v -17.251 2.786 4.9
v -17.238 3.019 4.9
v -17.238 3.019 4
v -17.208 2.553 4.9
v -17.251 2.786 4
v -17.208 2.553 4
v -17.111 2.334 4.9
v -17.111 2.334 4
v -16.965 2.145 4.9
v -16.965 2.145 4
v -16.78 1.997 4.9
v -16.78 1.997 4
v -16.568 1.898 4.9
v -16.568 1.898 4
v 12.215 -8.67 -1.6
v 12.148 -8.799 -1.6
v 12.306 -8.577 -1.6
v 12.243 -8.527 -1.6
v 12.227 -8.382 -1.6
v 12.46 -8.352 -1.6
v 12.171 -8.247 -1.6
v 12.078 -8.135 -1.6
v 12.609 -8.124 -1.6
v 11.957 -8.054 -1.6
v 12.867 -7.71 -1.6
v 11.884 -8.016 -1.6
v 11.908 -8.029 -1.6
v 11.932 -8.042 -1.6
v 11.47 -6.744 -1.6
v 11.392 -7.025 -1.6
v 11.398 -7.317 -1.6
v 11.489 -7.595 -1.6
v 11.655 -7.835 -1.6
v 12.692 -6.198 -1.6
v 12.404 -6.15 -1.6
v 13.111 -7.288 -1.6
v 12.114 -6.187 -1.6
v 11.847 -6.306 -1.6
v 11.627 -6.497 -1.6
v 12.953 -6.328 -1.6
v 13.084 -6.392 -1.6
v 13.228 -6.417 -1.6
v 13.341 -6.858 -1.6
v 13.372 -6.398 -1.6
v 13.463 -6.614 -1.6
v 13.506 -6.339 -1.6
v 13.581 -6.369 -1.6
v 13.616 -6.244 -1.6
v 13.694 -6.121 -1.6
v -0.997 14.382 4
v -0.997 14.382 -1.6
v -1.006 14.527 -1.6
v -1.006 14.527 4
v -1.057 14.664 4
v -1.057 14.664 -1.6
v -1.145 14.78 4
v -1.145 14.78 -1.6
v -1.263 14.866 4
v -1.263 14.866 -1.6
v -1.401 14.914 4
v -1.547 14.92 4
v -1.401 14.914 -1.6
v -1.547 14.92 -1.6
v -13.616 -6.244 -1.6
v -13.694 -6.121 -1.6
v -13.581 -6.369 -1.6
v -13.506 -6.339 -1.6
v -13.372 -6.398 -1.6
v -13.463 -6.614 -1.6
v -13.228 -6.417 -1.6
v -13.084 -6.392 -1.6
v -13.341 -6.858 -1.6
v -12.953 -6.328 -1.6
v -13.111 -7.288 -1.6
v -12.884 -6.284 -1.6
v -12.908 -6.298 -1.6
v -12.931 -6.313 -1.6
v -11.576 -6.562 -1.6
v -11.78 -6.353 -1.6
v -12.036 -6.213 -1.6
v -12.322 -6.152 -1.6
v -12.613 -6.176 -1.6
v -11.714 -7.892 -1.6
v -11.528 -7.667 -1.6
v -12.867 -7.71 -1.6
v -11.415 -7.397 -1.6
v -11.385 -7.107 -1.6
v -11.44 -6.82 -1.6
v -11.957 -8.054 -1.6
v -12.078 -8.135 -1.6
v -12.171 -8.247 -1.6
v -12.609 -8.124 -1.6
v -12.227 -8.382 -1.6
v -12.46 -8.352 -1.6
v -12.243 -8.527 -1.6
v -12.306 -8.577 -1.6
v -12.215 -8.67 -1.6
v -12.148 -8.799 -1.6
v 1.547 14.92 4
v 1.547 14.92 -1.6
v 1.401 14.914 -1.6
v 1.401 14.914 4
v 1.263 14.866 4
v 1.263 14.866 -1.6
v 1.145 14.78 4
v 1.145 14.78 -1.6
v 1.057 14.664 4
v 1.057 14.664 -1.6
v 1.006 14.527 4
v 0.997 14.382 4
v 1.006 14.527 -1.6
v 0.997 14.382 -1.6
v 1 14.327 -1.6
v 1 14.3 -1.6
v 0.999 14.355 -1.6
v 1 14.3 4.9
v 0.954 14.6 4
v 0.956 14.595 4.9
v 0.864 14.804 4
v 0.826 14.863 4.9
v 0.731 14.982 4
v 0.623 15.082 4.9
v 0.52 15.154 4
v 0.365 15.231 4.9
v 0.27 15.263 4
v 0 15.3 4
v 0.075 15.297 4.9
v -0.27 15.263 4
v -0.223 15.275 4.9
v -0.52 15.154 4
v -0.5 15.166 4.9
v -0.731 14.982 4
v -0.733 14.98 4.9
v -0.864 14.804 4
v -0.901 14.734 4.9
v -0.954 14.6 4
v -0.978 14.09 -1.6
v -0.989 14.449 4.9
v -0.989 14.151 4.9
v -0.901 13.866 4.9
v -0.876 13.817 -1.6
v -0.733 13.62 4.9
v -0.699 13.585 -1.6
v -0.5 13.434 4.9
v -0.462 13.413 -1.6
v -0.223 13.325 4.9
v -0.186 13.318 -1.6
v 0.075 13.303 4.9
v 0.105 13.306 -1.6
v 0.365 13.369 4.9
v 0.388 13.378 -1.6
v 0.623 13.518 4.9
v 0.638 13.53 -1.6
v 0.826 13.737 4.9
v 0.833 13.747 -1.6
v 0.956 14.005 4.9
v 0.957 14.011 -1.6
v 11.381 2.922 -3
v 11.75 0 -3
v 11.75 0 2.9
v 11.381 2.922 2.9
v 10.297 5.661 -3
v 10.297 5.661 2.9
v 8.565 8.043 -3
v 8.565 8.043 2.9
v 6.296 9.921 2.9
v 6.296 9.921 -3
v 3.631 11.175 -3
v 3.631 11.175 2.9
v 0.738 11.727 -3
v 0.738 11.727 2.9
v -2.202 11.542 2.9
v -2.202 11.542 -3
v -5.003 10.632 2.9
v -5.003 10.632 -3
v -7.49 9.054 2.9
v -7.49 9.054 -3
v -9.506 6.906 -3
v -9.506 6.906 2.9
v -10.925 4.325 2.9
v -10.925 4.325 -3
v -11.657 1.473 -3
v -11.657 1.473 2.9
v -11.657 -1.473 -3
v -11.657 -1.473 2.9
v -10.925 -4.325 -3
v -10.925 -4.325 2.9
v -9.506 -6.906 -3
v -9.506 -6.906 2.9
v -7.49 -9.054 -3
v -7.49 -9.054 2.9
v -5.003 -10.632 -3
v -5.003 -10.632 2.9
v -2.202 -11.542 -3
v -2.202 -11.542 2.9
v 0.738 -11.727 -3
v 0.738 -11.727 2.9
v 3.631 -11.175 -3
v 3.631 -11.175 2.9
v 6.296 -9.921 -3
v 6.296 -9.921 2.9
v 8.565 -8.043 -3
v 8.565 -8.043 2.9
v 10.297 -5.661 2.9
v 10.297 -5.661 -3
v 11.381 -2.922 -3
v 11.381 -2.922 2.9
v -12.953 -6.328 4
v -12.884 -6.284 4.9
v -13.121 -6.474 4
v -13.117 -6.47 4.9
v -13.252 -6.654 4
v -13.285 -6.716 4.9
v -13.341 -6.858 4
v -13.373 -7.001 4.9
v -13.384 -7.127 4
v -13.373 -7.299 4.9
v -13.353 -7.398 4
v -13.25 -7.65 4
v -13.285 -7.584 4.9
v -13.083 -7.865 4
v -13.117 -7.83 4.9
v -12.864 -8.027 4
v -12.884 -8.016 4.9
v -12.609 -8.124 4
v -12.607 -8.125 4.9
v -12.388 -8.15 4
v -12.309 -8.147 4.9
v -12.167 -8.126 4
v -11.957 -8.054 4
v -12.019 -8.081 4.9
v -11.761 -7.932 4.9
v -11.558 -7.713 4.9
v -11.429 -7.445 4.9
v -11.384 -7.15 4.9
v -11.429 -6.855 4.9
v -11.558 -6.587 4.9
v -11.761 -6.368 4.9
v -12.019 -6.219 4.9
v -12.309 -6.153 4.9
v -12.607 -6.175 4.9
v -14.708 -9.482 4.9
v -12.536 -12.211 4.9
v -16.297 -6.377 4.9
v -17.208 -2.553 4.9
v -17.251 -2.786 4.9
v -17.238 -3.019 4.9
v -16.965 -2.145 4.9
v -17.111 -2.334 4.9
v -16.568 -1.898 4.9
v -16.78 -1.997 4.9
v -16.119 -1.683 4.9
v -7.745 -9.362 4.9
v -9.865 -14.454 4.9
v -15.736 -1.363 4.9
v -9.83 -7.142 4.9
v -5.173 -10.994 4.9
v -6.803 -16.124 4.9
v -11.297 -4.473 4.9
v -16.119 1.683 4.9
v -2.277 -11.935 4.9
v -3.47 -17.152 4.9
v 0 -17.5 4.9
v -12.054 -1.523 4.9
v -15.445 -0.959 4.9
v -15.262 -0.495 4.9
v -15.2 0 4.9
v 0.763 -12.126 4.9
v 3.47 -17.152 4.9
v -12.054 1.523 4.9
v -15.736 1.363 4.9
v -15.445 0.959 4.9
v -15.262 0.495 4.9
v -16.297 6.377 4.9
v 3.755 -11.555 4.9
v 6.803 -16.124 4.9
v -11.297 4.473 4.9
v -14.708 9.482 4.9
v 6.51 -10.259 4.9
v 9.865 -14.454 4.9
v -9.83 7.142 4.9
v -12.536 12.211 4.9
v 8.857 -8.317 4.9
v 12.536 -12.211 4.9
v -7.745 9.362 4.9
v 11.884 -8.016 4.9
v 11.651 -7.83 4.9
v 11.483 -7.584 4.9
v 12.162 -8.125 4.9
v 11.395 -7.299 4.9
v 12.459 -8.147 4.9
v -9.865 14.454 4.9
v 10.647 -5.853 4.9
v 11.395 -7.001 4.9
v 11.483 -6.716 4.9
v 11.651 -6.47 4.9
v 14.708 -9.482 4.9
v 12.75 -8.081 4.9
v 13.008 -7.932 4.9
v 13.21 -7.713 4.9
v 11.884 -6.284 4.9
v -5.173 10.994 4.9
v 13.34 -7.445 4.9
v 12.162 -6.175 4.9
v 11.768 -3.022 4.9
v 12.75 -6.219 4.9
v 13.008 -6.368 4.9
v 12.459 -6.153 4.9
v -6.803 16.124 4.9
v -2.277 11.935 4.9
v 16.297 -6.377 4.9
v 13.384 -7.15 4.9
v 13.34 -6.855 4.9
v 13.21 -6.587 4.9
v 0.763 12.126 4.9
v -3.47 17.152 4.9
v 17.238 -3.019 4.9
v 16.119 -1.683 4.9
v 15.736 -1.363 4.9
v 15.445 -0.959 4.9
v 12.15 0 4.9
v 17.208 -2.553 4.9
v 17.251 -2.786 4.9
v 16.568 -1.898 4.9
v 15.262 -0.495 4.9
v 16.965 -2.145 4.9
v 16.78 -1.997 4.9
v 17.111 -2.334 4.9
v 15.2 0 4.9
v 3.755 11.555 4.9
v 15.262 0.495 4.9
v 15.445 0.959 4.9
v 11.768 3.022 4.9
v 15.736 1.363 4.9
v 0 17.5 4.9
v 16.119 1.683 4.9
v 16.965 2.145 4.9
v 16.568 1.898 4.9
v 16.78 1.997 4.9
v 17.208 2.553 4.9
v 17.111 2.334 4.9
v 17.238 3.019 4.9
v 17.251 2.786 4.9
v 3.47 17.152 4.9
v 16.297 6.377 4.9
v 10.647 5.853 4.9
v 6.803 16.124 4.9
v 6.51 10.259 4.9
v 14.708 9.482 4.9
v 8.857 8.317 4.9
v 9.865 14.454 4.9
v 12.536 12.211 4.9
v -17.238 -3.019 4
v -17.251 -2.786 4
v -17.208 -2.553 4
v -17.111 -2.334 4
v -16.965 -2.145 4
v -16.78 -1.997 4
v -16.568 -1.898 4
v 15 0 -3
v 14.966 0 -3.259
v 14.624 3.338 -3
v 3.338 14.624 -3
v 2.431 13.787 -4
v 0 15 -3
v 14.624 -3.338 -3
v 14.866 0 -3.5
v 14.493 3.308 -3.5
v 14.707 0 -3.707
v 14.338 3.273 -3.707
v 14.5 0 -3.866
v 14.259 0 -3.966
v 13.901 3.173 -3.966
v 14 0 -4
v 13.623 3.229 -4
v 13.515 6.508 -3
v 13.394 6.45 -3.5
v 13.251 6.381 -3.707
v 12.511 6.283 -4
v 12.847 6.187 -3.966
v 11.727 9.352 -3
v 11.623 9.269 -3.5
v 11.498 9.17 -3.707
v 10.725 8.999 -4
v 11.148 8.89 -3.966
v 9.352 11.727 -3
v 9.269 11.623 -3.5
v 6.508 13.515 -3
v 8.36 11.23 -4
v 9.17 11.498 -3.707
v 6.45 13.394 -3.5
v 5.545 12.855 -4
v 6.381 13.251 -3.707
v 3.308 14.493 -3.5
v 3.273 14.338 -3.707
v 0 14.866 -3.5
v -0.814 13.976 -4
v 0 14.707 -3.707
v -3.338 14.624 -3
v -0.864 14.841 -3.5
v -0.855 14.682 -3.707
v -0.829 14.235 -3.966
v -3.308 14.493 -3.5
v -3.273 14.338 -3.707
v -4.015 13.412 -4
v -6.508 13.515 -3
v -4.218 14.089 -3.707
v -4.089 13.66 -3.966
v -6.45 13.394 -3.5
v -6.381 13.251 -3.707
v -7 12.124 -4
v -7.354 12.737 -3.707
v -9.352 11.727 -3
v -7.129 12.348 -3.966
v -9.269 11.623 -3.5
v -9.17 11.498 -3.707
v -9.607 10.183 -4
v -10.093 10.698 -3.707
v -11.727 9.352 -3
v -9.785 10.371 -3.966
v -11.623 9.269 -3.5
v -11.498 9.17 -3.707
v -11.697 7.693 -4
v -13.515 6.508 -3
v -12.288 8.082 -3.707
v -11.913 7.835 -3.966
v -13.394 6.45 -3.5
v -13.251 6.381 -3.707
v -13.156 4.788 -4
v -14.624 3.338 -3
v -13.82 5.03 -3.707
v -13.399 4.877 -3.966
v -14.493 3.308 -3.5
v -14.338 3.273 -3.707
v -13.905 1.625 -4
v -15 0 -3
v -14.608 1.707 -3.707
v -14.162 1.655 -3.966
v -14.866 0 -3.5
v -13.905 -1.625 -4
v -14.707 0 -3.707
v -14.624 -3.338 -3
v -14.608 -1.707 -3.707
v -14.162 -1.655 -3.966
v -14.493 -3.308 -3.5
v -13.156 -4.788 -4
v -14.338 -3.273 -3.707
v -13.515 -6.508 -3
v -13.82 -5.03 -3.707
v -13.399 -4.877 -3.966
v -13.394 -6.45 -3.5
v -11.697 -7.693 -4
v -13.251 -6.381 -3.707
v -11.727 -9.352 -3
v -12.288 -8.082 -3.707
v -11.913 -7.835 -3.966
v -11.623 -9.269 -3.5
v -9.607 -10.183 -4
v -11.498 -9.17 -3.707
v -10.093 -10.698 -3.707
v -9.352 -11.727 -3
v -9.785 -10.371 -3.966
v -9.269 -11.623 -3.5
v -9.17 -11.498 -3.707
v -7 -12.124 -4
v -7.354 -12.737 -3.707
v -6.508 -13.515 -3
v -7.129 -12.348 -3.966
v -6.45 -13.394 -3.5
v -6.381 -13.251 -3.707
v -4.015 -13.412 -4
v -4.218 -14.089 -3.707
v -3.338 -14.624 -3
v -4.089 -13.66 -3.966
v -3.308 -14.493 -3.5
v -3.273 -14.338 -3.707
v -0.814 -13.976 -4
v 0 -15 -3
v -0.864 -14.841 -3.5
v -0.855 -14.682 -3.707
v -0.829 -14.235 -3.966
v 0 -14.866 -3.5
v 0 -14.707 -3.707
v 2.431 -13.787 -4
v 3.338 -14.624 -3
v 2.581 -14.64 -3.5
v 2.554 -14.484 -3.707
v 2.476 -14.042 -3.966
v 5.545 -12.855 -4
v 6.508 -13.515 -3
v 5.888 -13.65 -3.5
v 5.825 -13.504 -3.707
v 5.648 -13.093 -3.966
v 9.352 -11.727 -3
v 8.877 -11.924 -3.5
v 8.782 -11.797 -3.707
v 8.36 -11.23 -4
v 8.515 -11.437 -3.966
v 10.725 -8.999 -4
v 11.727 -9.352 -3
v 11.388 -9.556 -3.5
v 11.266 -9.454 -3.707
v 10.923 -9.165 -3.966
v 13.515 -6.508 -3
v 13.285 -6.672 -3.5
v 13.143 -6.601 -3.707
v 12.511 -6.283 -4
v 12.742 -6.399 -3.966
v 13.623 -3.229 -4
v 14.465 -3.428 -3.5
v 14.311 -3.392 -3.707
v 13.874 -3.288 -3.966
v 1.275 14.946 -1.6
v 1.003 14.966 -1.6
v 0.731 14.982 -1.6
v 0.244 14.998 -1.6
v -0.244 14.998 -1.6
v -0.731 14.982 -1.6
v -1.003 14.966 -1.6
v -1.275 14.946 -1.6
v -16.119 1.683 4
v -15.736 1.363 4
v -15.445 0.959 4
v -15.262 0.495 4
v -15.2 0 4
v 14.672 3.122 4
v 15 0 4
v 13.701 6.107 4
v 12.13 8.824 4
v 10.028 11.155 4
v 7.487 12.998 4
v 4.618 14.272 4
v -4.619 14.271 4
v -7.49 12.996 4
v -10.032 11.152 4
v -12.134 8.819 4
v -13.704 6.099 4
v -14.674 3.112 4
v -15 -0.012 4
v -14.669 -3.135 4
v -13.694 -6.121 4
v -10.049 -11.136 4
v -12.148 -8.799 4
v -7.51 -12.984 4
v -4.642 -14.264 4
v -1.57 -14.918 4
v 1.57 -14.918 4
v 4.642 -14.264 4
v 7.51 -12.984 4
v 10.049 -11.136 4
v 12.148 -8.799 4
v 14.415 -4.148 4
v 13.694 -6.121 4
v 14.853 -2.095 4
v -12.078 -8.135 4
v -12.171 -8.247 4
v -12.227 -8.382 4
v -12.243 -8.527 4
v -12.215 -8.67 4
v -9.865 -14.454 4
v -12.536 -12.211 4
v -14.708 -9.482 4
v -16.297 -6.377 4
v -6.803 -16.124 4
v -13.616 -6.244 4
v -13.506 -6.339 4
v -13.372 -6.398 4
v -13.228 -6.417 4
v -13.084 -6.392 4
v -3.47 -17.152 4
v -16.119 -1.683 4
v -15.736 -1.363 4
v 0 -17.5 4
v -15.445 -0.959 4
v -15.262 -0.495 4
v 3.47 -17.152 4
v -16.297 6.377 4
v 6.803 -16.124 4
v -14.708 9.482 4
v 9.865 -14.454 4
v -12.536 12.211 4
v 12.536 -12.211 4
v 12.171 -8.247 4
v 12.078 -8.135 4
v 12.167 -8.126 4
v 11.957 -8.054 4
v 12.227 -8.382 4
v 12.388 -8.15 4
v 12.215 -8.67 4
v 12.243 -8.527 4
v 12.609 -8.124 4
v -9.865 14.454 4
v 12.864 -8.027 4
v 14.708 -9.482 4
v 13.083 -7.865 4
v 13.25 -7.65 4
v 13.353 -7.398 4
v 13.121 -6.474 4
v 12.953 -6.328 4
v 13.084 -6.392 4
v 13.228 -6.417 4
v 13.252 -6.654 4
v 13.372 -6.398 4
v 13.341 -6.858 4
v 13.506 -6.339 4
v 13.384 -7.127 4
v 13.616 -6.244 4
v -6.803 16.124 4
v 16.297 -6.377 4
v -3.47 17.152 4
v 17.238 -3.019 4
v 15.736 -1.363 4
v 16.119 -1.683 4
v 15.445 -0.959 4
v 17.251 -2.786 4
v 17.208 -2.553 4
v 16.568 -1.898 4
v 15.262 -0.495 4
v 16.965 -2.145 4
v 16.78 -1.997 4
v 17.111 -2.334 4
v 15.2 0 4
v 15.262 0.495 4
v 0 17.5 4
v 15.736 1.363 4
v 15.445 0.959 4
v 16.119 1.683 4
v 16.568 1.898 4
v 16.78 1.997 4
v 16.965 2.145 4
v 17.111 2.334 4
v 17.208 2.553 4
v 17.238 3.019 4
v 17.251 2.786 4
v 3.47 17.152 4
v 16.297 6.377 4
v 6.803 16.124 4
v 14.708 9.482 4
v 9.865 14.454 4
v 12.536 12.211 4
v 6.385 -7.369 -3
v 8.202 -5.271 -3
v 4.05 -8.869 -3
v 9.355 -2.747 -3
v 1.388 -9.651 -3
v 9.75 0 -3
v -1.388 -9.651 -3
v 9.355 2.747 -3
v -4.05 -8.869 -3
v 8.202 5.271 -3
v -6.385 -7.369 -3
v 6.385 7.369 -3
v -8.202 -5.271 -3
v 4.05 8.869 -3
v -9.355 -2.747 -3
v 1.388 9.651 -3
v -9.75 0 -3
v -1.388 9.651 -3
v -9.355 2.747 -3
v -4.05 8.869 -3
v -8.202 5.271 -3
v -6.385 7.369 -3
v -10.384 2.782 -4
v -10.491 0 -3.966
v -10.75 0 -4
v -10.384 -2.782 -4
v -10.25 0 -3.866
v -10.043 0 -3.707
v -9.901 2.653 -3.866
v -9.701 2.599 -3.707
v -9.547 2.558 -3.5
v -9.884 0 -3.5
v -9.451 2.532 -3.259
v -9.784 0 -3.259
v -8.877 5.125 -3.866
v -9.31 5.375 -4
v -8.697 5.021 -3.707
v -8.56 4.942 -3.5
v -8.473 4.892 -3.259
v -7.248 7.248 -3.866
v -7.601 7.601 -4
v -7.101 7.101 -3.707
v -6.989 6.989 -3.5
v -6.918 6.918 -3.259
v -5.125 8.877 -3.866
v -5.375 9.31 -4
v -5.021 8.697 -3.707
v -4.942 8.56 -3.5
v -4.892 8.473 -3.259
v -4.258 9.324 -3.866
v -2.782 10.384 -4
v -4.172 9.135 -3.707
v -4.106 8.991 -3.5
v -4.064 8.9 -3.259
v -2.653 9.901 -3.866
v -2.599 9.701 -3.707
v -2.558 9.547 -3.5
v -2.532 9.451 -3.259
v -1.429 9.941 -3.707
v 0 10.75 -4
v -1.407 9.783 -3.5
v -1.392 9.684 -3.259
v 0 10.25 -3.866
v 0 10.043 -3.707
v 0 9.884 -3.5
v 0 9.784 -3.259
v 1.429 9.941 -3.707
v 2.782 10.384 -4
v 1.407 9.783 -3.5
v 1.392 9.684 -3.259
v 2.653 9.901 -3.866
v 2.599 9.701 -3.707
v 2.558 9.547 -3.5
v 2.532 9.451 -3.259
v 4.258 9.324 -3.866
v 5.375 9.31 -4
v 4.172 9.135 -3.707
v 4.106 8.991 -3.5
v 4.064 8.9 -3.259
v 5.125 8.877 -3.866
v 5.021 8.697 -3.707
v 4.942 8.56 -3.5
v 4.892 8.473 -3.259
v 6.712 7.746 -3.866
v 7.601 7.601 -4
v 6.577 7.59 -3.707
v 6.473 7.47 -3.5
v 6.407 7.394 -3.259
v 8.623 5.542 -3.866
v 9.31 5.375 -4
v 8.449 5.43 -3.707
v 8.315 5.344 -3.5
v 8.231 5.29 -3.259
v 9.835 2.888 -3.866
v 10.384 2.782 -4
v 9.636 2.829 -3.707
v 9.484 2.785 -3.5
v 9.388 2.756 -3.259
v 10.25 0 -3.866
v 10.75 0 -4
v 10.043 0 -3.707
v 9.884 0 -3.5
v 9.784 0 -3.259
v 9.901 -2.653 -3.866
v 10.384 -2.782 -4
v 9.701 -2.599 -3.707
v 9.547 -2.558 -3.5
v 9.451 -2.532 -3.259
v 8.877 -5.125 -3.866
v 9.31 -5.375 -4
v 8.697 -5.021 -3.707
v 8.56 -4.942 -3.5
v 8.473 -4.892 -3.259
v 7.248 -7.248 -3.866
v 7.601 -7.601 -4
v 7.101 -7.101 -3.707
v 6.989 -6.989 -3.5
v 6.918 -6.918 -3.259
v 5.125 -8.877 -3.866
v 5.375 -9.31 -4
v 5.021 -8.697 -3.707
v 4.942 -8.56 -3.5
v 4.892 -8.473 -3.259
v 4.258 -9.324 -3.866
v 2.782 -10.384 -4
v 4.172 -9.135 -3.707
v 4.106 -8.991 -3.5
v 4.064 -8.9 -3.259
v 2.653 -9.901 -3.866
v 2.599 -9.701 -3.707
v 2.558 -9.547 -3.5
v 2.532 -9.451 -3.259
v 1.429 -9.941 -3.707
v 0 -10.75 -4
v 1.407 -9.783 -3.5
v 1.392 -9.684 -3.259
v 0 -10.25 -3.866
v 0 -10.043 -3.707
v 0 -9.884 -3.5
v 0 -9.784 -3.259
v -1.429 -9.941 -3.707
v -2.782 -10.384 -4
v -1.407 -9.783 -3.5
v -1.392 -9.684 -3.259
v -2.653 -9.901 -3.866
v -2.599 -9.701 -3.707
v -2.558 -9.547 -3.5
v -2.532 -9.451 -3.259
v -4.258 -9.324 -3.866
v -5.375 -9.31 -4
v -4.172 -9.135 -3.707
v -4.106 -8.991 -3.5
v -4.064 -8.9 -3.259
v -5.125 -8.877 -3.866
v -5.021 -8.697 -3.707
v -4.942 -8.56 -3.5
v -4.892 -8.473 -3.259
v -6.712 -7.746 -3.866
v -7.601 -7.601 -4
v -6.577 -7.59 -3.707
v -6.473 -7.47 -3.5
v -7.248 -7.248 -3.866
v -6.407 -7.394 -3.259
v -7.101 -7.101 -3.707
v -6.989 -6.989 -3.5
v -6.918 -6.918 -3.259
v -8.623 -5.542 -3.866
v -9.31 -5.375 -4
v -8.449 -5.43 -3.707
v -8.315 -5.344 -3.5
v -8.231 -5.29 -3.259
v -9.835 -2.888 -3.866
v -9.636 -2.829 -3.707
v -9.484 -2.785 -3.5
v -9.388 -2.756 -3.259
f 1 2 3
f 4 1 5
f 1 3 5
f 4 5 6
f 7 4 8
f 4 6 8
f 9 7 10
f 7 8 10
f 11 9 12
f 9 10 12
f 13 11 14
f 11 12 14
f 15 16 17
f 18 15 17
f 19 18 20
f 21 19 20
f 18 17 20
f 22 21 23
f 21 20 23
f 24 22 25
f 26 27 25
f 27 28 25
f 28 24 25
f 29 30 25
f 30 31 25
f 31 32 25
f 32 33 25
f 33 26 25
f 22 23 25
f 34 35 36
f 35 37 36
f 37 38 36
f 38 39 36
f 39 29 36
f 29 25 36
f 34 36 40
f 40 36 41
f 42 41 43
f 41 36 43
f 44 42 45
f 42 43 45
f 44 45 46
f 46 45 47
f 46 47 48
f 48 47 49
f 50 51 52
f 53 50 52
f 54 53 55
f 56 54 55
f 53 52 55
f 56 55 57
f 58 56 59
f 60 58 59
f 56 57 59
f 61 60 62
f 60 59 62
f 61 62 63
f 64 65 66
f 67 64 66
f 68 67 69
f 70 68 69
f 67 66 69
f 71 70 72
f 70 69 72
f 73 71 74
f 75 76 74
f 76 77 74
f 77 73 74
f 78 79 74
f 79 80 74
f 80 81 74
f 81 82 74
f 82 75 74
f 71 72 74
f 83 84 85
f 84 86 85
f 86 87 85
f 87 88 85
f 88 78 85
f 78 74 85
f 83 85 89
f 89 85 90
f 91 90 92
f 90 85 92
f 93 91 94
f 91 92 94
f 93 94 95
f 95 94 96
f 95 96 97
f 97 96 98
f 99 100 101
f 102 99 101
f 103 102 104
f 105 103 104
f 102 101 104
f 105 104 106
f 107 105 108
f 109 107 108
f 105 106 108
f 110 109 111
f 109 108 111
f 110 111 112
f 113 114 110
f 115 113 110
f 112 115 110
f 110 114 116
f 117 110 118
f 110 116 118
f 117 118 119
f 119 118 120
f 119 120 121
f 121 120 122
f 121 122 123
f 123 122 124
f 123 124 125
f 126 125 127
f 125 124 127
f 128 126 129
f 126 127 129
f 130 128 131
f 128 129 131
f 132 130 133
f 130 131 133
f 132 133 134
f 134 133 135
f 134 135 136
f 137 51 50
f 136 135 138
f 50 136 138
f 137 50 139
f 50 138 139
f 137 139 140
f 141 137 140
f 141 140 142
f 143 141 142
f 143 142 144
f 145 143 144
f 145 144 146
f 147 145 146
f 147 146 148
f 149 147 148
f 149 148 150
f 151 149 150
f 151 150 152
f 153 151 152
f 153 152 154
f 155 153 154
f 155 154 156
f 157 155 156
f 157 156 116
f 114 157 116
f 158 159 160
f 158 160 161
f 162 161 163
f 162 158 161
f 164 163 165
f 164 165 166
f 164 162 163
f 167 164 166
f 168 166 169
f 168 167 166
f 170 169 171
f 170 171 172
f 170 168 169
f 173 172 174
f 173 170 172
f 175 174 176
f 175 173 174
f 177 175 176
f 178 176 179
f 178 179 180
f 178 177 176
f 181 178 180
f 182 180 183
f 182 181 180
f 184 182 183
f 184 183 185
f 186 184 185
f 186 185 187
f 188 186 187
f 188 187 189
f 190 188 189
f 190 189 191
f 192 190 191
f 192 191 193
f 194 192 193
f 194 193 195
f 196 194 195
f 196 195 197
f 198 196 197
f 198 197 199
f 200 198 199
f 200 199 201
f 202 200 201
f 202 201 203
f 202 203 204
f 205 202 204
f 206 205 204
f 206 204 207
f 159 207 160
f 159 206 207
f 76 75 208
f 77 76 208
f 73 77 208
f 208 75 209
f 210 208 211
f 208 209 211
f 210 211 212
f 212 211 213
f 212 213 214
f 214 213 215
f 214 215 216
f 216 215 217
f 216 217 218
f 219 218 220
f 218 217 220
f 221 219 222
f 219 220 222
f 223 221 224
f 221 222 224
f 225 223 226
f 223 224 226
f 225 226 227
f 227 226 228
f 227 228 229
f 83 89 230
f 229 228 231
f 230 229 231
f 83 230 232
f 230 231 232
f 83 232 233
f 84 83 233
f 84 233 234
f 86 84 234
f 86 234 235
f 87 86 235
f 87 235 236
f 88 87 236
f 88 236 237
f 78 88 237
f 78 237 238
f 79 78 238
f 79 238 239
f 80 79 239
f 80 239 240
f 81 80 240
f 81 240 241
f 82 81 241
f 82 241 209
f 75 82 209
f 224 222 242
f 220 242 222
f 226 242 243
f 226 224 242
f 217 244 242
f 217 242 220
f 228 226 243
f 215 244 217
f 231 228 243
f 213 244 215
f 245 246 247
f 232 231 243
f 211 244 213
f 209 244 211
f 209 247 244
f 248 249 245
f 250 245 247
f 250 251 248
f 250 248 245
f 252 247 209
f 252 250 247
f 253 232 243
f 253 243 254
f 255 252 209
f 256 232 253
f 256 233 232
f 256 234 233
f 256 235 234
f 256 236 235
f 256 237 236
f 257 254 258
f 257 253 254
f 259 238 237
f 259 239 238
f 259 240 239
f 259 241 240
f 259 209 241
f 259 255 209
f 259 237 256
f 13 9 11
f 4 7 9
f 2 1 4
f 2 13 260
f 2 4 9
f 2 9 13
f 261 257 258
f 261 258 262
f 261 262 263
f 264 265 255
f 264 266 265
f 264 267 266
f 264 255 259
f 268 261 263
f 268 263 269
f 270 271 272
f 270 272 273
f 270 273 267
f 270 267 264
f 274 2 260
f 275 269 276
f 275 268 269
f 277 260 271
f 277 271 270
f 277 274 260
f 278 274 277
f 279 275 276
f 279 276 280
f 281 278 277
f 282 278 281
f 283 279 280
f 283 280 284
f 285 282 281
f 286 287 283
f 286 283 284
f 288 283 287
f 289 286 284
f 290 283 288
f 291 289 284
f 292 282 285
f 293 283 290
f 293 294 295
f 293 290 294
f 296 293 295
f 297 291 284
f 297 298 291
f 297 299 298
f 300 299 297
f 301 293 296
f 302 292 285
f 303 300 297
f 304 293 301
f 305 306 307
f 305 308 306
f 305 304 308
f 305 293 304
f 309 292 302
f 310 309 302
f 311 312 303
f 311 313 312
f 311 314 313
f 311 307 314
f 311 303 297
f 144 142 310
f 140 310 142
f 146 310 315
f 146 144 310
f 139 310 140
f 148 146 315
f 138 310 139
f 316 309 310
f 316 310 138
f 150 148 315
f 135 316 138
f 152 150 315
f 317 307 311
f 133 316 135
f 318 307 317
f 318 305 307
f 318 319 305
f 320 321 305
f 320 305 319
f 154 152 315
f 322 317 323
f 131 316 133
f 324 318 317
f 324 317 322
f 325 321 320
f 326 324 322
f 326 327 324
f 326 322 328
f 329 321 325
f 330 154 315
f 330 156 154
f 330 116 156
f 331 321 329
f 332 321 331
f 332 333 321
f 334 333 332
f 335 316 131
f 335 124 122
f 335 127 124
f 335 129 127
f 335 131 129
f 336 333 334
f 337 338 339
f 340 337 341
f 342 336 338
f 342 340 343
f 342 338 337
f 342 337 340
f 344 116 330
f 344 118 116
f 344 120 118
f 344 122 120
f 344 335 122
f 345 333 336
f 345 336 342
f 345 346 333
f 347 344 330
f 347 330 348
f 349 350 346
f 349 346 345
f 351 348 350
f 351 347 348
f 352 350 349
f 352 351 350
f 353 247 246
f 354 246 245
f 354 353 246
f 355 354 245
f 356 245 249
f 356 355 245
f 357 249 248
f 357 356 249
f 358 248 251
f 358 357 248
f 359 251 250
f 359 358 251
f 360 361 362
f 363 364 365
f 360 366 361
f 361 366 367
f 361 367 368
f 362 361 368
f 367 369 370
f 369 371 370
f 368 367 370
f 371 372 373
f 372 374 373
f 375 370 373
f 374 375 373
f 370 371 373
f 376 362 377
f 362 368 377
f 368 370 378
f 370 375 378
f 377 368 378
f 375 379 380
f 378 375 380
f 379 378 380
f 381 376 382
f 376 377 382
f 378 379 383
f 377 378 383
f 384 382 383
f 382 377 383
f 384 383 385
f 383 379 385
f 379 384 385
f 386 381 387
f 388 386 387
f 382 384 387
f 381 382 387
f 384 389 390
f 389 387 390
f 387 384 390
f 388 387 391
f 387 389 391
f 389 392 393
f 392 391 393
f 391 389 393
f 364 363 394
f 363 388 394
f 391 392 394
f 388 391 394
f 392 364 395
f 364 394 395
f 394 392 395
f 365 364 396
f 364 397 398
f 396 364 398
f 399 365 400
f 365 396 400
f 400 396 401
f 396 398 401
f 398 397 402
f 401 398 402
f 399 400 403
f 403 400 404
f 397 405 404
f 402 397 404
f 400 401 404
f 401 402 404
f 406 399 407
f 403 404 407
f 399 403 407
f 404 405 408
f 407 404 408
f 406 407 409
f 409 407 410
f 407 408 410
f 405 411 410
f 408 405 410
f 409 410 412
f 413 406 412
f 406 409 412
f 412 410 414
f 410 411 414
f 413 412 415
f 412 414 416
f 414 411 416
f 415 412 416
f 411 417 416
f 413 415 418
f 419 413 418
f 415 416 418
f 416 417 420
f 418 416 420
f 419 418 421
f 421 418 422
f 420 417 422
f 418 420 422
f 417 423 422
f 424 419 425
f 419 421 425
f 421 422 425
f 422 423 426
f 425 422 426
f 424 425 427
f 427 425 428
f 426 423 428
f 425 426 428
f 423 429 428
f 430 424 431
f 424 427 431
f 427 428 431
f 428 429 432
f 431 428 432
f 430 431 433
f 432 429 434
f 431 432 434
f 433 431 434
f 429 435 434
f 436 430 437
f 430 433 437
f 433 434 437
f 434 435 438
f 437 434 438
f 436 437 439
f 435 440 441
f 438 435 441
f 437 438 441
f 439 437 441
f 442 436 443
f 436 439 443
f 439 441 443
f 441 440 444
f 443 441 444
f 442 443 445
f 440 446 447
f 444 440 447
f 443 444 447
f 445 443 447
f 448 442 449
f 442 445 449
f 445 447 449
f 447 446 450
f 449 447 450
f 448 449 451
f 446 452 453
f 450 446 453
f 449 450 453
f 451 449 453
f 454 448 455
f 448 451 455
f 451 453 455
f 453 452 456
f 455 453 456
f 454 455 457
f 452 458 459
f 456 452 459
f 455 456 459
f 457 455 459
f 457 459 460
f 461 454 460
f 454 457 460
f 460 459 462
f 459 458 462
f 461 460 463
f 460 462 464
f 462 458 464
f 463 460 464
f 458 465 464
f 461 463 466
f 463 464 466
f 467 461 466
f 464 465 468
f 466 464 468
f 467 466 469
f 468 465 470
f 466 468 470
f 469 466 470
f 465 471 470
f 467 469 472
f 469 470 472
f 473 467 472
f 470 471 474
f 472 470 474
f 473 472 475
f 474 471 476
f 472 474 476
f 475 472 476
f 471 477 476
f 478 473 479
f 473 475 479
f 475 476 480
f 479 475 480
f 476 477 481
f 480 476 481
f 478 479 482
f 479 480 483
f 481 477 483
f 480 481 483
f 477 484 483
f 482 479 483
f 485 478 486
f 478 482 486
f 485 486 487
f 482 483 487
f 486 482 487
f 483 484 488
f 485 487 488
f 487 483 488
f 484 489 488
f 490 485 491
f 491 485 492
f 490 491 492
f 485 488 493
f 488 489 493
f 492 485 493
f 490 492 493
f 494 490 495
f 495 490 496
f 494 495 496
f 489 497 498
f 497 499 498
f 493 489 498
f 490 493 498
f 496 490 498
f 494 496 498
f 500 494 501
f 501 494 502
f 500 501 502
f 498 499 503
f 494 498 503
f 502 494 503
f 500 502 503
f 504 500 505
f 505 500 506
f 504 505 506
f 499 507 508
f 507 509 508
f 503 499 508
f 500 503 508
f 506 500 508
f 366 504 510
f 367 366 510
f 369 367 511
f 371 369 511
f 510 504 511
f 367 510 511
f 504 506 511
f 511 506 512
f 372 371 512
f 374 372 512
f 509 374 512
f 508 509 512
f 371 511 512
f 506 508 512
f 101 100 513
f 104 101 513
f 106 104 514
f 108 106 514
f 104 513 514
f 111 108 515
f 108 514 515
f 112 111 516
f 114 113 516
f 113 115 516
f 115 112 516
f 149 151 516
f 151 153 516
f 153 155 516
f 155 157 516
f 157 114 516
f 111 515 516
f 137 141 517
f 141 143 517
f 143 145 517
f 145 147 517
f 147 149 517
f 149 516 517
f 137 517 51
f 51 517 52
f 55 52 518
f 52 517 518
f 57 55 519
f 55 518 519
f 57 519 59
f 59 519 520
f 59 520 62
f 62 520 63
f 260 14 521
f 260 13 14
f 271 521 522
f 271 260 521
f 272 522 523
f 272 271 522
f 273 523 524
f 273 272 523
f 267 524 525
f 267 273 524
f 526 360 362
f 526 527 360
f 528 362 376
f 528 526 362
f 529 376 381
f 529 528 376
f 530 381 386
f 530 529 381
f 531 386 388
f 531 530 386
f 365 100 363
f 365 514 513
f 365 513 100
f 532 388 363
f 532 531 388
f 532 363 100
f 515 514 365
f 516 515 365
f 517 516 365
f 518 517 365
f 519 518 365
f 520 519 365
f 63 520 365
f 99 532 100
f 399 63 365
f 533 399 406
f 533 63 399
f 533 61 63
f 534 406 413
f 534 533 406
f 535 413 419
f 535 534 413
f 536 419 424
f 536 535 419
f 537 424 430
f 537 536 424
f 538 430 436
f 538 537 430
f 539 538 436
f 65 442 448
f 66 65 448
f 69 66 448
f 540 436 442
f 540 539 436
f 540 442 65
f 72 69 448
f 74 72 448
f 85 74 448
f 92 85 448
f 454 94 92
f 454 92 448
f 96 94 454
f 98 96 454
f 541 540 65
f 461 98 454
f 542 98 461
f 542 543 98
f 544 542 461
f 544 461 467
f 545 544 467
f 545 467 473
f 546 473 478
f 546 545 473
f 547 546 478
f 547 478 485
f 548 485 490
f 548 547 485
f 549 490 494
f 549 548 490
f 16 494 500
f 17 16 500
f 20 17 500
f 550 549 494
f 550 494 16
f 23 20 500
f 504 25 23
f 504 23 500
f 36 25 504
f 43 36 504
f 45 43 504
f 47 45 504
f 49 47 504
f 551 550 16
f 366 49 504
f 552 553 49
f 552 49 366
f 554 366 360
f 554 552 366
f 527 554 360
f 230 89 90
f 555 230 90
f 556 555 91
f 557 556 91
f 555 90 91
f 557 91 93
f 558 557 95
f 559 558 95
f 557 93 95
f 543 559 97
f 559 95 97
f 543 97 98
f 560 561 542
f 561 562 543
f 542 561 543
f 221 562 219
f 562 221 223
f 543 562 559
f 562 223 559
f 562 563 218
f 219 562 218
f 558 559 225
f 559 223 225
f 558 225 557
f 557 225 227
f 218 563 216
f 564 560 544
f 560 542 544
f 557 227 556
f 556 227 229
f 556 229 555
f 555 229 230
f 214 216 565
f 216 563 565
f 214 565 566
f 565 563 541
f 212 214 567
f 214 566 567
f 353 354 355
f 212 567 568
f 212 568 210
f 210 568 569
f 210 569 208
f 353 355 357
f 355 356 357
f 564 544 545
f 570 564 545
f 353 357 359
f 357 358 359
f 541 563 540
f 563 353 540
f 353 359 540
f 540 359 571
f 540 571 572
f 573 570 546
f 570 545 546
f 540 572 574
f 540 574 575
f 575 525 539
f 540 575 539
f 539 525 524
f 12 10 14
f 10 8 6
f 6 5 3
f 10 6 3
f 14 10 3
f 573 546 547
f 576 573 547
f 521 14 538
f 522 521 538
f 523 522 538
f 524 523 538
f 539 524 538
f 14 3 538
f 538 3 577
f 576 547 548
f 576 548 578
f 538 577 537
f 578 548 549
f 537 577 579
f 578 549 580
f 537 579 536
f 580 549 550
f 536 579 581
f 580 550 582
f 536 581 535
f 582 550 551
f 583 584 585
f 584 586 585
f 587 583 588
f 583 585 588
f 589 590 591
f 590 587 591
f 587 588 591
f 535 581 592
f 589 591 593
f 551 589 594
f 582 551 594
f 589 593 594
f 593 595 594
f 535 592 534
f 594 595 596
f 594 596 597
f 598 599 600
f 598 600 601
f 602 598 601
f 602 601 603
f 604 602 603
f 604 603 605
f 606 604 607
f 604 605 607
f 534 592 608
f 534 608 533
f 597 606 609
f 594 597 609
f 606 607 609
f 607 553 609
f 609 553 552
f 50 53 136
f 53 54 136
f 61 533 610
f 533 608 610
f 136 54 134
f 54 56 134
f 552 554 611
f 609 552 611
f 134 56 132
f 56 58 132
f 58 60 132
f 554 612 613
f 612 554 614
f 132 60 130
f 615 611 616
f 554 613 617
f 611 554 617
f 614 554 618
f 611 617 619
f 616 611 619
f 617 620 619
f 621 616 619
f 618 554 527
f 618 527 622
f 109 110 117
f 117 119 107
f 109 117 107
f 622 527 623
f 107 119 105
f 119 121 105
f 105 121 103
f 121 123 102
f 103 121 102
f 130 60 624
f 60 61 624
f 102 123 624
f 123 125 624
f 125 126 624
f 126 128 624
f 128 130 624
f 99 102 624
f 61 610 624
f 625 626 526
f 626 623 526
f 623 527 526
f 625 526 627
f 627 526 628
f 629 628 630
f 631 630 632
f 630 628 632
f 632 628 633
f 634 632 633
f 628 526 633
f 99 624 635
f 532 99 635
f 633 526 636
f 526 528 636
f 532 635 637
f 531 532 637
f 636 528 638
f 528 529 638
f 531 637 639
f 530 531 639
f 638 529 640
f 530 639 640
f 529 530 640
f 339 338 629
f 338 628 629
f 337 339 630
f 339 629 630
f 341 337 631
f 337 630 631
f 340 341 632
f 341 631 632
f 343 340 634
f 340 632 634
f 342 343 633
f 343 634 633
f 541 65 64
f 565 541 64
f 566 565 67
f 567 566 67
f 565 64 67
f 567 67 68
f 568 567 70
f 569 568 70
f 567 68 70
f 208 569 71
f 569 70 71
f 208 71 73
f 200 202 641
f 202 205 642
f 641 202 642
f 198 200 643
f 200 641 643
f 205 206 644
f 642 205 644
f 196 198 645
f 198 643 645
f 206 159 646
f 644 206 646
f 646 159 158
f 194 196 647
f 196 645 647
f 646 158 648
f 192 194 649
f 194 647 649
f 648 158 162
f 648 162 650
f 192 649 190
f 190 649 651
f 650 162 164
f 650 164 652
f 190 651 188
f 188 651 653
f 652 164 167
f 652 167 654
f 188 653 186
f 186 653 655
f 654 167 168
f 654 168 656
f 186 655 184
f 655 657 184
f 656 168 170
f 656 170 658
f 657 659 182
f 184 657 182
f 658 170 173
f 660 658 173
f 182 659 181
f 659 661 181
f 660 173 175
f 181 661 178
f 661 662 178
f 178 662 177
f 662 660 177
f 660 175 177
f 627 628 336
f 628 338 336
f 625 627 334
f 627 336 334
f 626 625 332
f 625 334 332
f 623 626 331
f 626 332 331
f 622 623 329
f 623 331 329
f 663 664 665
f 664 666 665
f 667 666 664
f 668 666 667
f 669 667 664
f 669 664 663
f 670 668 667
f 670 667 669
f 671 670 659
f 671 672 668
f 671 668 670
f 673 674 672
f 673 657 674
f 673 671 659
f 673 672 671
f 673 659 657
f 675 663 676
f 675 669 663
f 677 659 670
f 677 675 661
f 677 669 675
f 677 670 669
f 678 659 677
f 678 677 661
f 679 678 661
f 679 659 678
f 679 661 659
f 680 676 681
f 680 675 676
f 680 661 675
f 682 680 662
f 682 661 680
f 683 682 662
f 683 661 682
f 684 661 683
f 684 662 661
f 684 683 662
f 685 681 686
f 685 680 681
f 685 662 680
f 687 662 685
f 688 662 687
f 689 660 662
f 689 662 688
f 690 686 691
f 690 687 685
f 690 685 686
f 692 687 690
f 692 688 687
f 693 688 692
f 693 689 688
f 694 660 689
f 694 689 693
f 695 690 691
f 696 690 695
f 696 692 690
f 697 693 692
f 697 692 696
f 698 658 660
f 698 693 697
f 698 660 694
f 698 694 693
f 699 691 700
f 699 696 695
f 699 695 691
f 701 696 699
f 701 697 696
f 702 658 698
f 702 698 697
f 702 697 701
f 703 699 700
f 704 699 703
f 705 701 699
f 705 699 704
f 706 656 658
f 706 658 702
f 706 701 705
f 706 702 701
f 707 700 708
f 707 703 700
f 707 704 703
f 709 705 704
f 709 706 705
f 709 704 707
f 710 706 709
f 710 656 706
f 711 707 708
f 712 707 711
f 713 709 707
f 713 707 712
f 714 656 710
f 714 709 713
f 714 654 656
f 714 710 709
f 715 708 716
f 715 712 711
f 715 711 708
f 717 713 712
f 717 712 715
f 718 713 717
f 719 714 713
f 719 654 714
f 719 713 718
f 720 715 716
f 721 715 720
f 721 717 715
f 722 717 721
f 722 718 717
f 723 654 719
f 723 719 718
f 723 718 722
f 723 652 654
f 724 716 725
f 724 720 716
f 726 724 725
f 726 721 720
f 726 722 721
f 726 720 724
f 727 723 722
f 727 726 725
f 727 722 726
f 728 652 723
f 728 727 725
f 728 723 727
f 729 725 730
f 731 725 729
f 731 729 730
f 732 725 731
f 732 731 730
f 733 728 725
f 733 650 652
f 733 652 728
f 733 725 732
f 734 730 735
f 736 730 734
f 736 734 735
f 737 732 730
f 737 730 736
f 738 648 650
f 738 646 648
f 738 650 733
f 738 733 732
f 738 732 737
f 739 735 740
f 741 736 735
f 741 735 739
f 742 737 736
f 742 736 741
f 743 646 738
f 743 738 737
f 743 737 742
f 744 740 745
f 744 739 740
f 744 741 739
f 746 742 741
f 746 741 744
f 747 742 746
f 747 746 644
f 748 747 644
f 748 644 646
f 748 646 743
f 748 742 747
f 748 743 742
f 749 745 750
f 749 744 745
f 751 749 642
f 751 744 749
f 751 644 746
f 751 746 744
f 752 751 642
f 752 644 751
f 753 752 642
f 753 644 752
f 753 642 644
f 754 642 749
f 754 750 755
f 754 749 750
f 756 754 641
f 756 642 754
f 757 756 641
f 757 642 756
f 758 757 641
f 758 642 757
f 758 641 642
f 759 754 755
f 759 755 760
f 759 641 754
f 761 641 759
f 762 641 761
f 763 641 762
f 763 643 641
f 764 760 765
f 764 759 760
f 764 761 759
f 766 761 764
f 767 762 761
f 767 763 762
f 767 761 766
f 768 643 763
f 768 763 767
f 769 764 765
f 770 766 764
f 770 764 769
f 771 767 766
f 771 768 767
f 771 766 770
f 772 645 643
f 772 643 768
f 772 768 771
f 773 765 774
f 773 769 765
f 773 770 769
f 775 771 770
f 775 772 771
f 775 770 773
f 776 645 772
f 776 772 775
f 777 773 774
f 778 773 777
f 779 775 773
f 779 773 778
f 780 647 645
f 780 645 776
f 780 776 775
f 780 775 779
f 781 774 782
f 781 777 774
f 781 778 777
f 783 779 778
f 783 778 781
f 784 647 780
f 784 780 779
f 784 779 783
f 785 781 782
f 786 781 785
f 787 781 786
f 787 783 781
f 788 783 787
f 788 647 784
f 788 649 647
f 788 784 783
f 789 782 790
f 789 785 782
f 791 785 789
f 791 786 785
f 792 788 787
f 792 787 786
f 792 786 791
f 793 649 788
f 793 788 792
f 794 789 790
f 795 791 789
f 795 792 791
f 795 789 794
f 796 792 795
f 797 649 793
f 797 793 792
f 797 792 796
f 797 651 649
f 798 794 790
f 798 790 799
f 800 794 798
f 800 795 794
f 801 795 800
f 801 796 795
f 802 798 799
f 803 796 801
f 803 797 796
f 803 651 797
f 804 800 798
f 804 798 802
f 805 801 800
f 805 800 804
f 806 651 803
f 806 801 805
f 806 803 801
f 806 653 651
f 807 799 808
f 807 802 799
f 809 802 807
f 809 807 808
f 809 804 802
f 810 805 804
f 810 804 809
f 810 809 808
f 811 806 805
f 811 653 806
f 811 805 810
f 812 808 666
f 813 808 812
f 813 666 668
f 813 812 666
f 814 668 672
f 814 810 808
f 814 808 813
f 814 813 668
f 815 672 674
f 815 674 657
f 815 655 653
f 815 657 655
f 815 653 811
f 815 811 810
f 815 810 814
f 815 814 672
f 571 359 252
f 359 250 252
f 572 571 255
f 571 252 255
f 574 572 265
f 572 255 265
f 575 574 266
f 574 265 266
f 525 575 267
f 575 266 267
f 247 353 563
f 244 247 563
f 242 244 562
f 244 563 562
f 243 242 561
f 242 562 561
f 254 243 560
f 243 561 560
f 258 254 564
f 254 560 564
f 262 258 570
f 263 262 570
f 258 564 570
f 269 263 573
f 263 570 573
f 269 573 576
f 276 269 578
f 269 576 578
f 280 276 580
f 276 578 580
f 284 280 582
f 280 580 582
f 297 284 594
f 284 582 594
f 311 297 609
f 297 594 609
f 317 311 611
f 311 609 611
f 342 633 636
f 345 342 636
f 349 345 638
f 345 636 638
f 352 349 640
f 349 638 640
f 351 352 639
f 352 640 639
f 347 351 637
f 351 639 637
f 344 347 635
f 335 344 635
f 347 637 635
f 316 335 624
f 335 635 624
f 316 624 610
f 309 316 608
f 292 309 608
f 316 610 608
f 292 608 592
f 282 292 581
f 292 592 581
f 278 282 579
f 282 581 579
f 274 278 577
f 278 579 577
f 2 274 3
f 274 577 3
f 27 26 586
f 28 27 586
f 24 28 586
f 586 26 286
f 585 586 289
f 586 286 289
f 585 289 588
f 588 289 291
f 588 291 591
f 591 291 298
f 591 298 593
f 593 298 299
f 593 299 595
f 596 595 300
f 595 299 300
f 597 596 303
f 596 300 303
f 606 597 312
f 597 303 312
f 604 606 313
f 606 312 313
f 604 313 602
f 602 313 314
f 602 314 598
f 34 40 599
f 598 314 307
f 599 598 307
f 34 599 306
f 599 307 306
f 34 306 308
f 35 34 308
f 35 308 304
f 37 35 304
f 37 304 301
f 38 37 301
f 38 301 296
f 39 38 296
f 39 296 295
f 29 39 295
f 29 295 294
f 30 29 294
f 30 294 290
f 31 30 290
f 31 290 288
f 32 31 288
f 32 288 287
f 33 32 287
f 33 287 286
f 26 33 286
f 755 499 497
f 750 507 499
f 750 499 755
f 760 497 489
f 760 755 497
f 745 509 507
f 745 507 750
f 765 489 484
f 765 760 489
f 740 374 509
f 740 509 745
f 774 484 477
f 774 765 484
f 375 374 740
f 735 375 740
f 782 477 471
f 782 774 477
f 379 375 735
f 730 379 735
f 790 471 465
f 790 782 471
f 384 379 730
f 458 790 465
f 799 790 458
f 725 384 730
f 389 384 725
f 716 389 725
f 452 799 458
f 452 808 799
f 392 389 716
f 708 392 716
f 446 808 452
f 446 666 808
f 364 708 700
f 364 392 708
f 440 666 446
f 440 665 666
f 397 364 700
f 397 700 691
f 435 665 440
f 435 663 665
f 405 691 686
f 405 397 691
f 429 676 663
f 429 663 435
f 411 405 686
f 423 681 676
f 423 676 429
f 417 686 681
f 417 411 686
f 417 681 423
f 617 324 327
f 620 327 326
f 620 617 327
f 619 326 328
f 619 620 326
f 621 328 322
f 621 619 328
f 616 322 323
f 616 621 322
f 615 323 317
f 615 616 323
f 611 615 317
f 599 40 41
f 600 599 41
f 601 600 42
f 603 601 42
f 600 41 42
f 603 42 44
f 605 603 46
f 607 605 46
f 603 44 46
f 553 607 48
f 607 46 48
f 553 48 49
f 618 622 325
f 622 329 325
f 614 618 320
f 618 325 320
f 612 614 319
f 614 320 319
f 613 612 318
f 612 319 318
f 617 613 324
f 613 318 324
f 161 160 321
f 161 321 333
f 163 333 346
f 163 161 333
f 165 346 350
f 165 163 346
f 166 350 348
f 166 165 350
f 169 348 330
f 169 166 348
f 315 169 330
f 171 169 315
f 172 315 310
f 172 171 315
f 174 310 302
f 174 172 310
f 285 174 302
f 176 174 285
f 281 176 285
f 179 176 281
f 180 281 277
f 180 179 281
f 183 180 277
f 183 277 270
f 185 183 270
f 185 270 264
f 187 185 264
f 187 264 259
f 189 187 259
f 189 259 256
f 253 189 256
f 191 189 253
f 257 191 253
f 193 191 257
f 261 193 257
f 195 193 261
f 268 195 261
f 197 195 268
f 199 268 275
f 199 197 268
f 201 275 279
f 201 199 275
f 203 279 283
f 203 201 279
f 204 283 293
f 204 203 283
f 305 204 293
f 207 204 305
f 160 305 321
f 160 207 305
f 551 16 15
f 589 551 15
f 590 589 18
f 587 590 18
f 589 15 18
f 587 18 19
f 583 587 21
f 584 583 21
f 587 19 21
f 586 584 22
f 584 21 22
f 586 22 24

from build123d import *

# Parameters (mm, degrees)
SKETCH_1_R               = 15
SKETCH_1_R_2             = 11.75
EXTRUDE_1_DEPTH          = 4
SKETCH_2_R               = 11.75
SKETCH_2_R_2             = 9.75
EXTRUDE_2_DEPTH          = 1
FILLET_1_R               = 1
FILLET_2_R               = 1
SKETCH_3_R               = 17.5
SKETCH_3_R_2             = 11.75
EXTRUDE_3_DEPTH          = 0.9
CUT_EXTRUDE_1_DEPTH      = 27.009613607
FILLET_3_R               = 2
FILLET_4_R               = 1
SKETCH_6_R               = 1
CUT_EXTRUDE_2_DEPTH      = 6.5
PATTERN_CIRCULAR_2_COUNT = 3
FILLET_6_R               = 0.5
CHAMFER_1_SIZE           = 0.4
CHAMFER_1_SIZE2          = 2


# Some blends are built 0.0001 mm under size
with BuildPart() as part:
    # 草图1 → 凸台-拉伸1 (new, symmetric)
    with BuildSketch(Plane.XY):
        Circle(SKETCH_1_R)
        Circle(SKETCH_1_R_2, mode=Mode.SUBTRACT)
    extrude(amount=EXTRUDE_1_DEPTH, both=True)

    # 草图2 → 凸台-拉伸2 (add)
    with BuildSketch(Plane(origin=(0, 0, -4), x_dir=(-1, 0, 0), z_dir=(0, 0, -1))):
        Circle(SKETCH_2_R)
        Circle(SKETCH_2_R_2, mode=Mode.SUBTRACT)
    extrude(amount=-EXTRUDE_2_DEPTH)

    # 圆角1
    fillet_1_edges = [part.edges().sort_by_distance(p)[0] for p in [
        (-15, 0, -4),
    ]]
    fillet(fillet_1_edges, radius=FILLET_1_R)

    # 圆角2
    fillet_2_edges = [part.edges().sort_by_distance(p)[0] for p in [
        (9.75, 0, -4),
    ]]
    fillet(fillet_2_edges, radius=FILLET_2_R - 0.0001)  # a hair under: the kernel refuses the full size

    # 草图3 → 凸台-拉伸3 (add)
    with BuildSketch(Plane.XY.offset(4)):
        Circle(SKETCH_3_R)
        with Locations(Location((0, 0, 0), (0, 0, 180))):
            Circle(SKETCH_3_R_2, mode=Mode.SUBTRACT)
    extrude(amount=EXTRUDE_3_DEPTH)

    # 草图4 → 切除-拉伸1 (cut, through all)
    with BuildSketch(Plane(origin=(0, 0, 4), x_dir=(-1, 0, 0), z_dir=(0, 0, -1))):
        with BuildLine():
            Line((-20.056660766, 2), (-15.067846561, 2))
            ThreePointArc((-15.067846561, 2), (-15.2, 0), (-15.067846561, -2))
            Line((-15.067846561, -2), (-20.056660766, -2))
            Line((-20.056660766, -2), (-20.056660766, 2))
        make_face()
    cut_extrude_1 = extrude(amount=-CUT_EXTRUDE_1_DEPTH, mode=Mode.SUBTRACT)

    # 镜向1: 切除-拉伸1 across plane
    add(cut_extrude_1.mirror(Plane(origin=(0, 0, 0), x_dir=(0, 0, 1), z_dir=(1, 0, 0))), mode=Mode.SUBTRACT)

    # 圆角3
    fillet_3_edges = [part.edges().sort_by_distance(p)[0] for p in [
        (-15.067846561, -2, 4.45),
        (-15.067846561, 2, 4.45),
        (15.067846561, -2, 4.45),
        (15.067846561, 2, 4.45),
    ]]
    fillet(fillet_3_edges, radius=FILLET_3_R - 0.0001)  # a hair under: the kernel refuses the full size

    # 圆角4
    fillet_4_edges = [part.edges().sort_by_distance(p)[0] for p in [
        (17.385338651, 2, 4.45),
        (17.385338651, -2, 4.45),
        (-17.385338651, -2, 4.45),
        (-17.385338651, 2, 4.45),
    ]]
    fillet(fillet_4_edges, radius=FILLET_4_R)

    # 草图6 → 切除-拉伸2 (cut)
    with BuildSketch(Plane.XY.offset(4.9)):
        with Locations((0, 14.3)):
            Circle(SKETCH_6_R)
    cut_extrude_2 = extrude(amount=-CUT_EXTRUDE_2_DEPTH, mode=Mode.SUBTRACT)

    # 阵列(圆周)2: 切除-拉伸2 ×3 about axis
    pattern_circular_2_axis = Axis((0, 0, 0), (0, 0, 1))
    for i in range(1, PATTERN_CIRCULAR_2_COUNT):
        add(cut_extrude_2.rotate(pattern_circular_2_axis, i * 360 / PATTERN_CIRCULAR_2_COUNT), mode=Mode.SUBTRACT)

    # 圆角6
    # the kernel refuses this fillet: 0.5 mm, written as the material it takes off along each edge
    with BuildSketch(Plane(origin=(-0.73119563, 14.982167832, -1.6), x_dir=(-0.997111465428935, -0.07595212643607639, 0), z_dir=(0, 0, 1)), Plane(origin=(13.340535761, -6.857849926, -1.6), x_dir=(0.4327792617493751, 0.9014999226842262, 0), z_dir=(0, 0, 1)), Plane(origin=(-12.609340132, -8.124317906, -1.6), x_dir=(0.5643322036795584, -0.8255477962481478, 0), z_dir=(0, 0, 1))) as fillet_6_piece_1:
        with BuildLine():
            CenterArc((0.804059787, 0.49981424), FILLET_6_R, 170.950986261, 100.610876057)
            ThreePointArc((0.310282709, 0.578453903), (0.203956844, 0.26304232), (0, 0))
            ThreePointArc((0, 0), (0.40884396, -0.005572815), (0.817687919, 0))
        make_face()
    extrude(amount=5.6, mode=Mode.SUBTRACT)
    with BuildSketch(Plane(origin=(0.73119563, 14.982167832, -1.6), x_dir=(0.997111465428935, -0.07595212643607635, 0), z_dir=(0, 0, 1)), Plane(origin=(12.609340132, -8.124317906, -1.6), x_dir=(-0.5643322036795624, -0.825547796248145, 0), z_dir=(0, 0, 1)), Plane(origin=(-13.340535761, -6.857849926, -1.6), x_dir=(-0.4327792617493753, 0.9014999226842261, 0), z_dir=(0, 0, 1))) as fillet_6_piece_2:
        with BuildLine():
            CenterArc((0.804059787, -0.49981424), FILLET_6_R, 88.438137682, 100.610876057)
            ThreePointArc((0.310282709, -0.578453903), (0.203956844, -0.26304232), (0, 0))
            ThreePointArc((0, 0), (0.40884396, 0.005572815), (0.817687919, 0))
        make_face()
    extrude(amount=5.6, mode=Mode.SUBTRACT)

    # 倒角1
    chamfer_1_edges = [part.edges().sort_by_distance(p)[0] for p in [
        (11.75, 0, 4.9),
    ]]
    chamfer_1_side = [part.faces().sort_by_distance(p)[0] for p in [
        (15.179125182, 1.457318687, 4.9),
    ]]
    chamfer(chamfer_1_edges, length=CHAMFER_1_SIZE, length2=CHAMFER_1_SIZE2, reference=chamfer_1_side[0])


solid = part.part
